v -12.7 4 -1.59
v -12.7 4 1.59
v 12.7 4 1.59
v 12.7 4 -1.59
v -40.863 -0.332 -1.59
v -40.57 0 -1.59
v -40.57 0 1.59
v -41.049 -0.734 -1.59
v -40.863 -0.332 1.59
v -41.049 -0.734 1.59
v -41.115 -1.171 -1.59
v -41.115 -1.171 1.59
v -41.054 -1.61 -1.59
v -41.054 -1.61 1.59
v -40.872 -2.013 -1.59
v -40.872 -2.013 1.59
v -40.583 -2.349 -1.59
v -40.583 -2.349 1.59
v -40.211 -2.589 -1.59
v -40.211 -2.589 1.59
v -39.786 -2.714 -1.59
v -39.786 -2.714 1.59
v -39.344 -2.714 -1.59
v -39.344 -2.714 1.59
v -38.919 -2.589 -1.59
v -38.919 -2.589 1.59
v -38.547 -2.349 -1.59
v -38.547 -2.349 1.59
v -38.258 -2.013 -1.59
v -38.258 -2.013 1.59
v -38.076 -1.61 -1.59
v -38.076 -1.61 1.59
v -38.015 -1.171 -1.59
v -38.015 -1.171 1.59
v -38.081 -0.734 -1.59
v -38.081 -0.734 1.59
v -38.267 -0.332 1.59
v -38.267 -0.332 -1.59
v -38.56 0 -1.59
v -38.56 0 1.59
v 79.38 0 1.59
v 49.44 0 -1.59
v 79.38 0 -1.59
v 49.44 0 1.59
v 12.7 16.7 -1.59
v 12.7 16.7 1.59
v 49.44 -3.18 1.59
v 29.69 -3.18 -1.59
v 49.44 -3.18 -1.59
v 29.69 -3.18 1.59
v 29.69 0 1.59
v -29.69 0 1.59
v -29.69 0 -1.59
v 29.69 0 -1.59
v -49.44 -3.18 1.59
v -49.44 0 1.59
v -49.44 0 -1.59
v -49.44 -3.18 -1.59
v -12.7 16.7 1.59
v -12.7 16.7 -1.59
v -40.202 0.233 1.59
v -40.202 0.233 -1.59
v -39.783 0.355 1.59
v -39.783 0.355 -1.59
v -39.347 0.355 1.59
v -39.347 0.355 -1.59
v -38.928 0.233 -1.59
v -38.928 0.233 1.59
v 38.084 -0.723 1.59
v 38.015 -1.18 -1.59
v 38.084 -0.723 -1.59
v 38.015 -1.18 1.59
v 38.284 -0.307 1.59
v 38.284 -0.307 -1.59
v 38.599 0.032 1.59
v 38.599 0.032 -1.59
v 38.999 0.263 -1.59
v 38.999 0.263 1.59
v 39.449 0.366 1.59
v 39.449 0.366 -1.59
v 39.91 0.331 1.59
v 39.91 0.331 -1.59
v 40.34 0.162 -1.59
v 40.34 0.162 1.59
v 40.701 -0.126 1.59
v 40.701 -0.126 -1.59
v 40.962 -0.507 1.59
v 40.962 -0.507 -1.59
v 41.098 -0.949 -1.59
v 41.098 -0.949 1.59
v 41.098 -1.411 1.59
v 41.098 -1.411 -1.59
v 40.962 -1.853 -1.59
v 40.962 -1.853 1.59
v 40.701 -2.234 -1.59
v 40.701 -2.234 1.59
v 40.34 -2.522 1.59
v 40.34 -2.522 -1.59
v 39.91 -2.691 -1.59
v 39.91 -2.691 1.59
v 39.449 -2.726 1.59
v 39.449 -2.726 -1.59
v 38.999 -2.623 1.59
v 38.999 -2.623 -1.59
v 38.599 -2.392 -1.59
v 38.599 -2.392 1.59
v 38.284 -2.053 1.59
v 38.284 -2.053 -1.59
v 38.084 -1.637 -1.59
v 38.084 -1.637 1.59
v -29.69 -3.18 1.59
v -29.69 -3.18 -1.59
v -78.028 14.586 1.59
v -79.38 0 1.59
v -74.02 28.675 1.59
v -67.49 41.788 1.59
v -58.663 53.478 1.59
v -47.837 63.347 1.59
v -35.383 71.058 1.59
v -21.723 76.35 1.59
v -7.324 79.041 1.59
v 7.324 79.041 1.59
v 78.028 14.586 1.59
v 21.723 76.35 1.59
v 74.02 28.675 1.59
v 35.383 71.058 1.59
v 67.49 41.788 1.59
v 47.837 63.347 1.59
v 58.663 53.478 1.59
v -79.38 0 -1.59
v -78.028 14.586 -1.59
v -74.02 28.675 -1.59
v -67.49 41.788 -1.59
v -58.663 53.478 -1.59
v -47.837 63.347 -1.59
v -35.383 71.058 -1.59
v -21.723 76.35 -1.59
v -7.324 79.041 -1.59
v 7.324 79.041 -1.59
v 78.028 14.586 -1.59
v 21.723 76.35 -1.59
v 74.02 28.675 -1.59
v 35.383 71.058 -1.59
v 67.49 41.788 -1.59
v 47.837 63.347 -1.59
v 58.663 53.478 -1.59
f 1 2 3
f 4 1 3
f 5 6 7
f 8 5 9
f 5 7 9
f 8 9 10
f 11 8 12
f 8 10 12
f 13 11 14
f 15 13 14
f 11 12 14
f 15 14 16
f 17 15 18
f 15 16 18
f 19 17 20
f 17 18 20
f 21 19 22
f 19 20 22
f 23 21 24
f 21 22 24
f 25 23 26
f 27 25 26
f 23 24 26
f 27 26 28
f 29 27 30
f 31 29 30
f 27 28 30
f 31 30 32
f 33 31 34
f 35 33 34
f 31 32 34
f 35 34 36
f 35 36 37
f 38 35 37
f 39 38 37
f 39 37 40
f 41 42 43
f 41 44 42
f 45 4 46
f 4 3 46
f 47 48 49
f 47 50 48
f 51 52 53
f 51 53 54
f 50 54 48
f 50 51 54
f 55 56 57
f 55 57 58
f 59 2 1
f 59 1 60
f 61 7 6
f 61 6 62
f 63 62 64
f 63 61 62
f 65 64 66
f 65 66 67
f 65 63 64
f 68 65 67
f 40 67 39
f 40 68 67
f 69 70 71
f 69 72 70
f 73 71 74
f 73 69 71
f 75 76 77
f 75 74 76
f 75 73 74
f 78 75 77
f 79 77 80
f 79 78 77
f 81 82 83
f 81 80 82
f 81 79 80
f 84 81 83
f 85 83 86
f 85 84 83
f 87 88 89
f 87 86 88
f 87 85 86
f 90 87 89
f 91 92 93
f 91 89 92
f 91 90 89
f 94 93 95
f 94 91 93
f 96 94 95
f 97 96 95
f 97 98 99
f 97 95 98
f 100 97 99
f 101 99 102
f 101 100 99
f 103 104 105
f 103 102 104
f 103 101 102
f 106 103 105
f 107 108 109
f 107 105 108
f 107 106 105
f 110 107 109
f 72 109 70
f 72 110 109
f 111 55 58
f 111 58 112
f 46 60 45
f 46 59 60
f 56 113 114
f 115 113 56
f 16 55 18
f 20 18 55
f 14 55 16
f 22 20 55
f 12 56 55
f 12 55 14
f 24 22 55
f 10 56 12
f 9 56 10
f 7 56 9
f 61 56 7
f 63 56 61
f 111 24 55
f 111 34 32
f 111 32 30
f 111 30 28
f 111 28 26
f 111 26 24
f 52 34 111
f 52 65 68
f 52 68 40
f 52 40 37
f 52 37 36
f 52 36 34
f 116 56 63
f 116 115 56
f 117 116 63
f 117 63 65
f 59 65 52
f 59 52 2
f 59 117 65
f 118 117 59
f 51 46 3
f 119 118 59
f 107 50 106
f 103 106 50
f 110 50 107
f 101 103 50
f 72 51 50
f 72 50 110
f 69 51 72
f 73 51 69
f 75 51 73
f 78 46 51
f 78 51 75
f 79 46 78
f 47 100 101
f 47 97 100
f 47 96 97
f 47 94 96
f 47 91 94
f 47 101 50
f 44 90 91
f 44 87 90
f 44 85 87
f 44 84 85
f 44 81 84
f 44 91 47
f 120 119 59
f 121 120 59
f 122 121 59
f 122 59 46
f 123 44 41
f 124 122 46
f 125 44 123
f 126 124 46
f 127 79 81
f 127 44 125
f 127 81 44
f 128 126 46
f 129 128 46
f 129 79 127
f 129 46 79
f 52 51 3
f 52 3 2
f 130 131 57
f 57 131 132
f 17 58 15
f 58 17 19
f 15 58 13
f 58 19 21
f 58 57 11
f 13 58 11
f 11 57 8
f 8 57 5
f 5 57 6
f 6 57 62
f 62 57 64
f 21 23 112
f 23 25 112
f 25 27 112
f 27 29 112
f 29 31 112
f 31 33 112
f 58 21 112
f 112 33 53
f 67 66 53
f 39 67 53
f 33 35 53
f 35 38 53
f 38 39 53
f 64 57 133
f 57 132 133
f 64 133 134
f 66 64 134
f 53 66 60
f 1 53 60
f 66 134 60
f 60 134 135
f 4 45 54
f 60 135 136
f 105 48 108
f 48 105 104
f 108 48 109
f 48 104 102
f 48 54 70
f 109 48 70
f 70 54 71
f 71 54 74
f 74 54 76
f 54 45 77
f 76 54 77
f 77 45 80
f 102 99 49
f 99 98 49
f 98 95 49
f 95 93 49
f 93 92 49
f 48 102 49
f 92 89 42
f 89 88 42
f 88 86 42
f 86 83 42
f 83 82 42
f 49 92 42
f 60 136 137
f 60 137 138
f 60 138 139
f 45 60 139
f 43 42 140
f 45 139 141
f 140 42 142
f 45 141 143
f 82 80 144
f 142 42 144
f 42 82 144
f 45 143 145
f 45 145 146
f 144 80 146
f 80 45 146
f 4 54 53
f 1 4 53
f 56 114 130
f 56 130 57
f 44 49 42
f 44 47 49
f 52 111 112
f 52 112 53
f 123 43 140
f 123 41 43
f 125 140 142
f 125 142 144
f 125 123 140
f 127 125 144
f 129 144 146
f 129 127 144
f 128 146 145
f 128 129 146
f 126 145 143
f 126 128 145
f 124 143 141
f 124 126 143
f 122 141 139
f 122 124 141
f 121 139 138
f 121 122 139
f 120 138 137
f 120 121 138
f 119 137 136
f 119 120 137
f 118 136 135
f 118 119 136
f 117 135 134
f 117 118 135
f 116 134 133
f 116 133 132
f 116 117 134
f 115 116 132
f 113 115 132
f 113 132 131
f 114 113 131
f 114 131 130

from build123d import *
from build123d.topology import SkipClean

# Parameters (mm, degrees)
SKETCH1_W           = 25.4
SKETCH1_H           = 12.7
BOSS_EXTRUDE1_DEPTH = 1.59
SKETCH1_4_R         = 1.55
CUT_EXTRUDE2_DEPTH  = 5


with BuildPart() as part:
    # Sketch1 → Boss-Extrude1 (new, symmetric)
    with BuildSketch(Plane.XY):
        with BuildLine():
            ThreePointArc((79.38, 0), (0, 79.38), (-79.38, 0))
            Line((-79.38, 0), (-49.44, 0))
            Line((-49.44, 0), (-49.44, -3.18))
            Line((-49.44, -3.18), (-29.69, -3.18))
            Line((-29.69, -3.18), (-29.69, 0))
            Line((-29.69, 0), (29.69, 0))
            Line((29.69, 0), (29.69, -3.18))
            Line((29.69, -3.18), (49.44, -3.18))
            Line((49.44, -3.18), (49.44, 0))
            Line((49.44, 0), (79.38, 0))
        make_face()
        with BuildLine():
            ThreePointArc((-40.570037313, 0), (-39.565, 0.37), (-38.559962687, 0))
            Line((-38.559962687, 0), (-40.570037313, 0))
        make_face(mode=Mode.SUBTRACT)
        with Locations((0, 10.35)):
            Rectangle(SKETCH1_W, SKETCH1_H, mode=Mode.SUBTRACT)
    extrude(amount=BOSS_EXTRUDE1_DEPTH, both=True)

    # Sketch1<4> → Cut-Extrude2 (cut, symmetric)
    with SkipClean():  # the faces are left unmerged after this step: merging them gives an invalid solid
        with BuildSketch(Plane.XY):
            with Locations((-39.565, -1.18)):
                Circle(SKETCH1_4_R)
        cut_extrude2 = extrude(amount=CUT_EXTRUDE2_DEPTH, both=True, mode=Mode.SUBTRACT)

    # Mirror1: Cut-Extrude2 across plane
    with SkipClean():  # the faces are left unmerged after this step: merging them gives an invalid solid
        add(cut_extrude2.mirror(Plane(origin=(0, 0, 0), x_dir=(0, 0, 1), z_dir=(1, 0, 0))), mode=Mode.SUBTRACT)


solid = part.part
